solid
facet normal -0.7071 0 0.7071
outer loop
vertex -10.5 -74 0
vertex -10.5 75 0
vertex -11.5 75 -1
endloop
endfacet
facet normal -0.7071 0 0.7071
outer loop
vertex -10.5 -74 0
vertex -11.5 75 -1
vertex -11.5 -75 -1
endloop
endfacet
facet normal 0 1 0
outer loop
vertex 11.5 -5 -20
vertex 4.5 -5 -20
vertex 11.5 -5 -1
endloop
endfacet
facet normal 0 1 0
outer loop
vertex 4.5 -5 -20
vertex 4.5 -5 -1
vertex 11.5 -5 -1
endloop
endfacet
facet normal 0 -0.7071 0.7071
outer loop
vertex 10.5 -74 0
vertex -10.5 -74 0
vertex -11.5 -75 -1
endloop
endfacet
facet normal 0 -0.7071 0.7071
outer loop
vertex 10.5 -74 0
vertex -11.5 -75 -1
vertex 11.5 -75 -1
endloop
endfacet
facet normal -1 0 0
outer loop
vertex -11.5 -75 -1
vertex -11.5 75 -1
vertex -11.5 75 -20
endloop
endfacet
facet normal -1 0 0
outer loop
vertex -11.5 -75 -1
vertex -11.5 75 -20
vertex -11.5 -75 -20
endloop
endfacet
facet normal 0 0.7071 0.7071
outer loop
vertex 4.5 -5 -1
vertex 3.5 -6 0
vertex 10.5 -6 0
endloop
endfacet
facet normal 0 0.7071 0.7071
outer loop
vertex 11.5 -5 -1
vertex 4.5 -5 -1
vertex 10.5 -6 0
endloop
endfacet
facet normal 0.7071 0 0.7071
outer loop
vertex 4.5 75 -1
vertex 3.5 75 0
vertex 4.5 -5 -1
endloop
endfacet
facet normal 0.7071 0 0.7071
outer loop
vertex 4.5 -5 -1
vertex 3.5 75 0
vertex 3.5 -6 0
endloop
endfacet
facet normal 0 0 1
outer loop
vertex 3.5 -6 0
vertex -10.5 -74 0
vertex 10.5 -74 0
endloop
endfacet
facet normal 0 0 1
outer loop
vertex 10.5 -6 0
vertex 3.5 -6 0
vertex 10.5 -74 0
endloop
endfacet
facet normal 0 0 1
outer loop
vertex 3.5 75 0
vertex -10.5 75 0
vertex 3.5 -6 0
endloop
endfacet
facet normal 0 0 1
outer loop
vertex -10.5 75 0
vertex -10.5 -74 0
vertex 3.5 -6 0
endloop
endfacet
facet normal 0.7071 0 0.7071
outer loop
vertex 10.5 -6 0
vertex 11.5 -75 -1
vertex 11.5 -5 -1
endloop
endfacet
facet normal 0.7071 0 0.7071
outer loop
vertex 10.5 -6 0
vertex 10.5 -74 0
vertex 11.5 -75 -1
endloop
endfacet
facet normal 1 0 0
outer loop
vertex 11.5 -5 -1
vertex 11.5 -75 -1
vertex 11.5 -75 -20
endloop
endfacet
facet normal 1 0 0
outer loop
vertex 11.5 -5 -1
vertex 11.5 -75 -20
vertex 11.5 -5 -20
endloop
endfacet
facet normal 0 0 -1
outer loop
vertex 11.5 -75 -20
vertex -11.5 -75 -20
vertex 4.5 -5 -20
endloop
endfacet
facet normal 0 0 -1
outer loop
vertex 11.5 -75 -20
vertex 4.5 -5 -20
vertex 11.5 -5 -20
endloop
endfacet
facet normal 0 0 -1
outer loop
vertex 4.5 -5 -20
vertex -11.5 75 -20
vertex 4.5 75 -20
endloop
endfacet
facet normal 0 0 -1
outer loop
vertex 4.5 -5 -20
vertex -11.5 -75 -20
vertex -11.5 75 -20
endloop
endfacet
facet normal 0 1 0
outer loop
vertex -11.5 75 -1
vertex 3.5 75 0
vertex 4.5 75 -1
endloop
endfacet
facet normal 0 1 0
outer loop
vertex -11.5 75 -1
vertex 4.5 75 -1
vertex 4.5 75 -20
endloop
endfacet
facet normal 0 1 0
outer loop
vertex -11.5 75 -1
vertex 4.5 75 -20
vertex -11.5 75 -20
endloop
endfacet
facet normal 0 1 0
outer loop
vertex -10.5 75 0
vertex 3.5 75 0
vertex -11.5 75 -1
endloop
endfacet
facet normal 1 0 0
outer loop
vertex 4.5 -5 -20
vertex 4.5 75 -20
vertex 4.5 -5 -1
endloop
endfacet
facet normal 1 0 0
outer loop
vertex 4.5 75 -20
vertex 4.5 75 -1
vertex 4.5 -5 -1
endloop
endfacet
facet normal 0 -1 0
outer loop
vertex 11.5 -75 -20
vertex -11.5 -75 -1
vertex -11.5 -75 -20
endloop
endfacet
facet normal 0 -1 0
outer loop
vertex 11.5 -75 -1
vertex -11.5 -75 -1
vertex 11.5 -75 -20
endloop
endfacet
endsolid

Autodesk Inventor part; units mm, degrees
ref_plane "YZ Plane" through (0, 0, 0) normal (1, 0, 0) x (0, 1, 0)
ref_plane "XZ Plane" through (0, 0, 0) normal (0, 1, 0) x (-1, 0, 0)
ref_plane "XY Plane" through (0, 0, 0) normal (0, 0, 1) x (1, 0, 0)
sketch "Sketch1" plane through (0, 0, 0) normal (0, 0, 1) x (1, 0, 0)
  line L0 (-11.5, -75) -> (11.5, -75)
  line L1 (11.5, -75) -> (11.5, 75)
  line L2 (11.5, 75) -> (-11.5, 75)
  line L3 (-11.5, 75) -> (-11.5, -75)
  line L4 (-11.5, -75) -> (11.5, 75) construction
  line L5 (11.5, -75) -> (-11.5, 75) construction
  line L6 (11.5, 75) -> (4.5, 75)
  line L7 (4.5, 75) -> (4.5, -5)
  line L8 (4.5, -5) -> (11.5, -5)
  line L9 (11.5, -5) -> (11.5, 75)
  point P0 (0, 0)
  dimension "key_width" = 23
  dimension "key_length" = 150
  dimension "blackkey_length" = 80
  dimension "blackkey_halfwidth" = 7
extrude "Extrusion1" add sketch "Sketch1" against normal blind 20 contours L3 L2 L7 L8 L1 L0
chamfer "Chamfer1" distance 1 angle 45 5 edges at (11.5, -40, 0) (0, -75, 0) (-11.5, 0, 0) (4.5, 35, 0) (8, -5, 0)
properties part number "key1"
